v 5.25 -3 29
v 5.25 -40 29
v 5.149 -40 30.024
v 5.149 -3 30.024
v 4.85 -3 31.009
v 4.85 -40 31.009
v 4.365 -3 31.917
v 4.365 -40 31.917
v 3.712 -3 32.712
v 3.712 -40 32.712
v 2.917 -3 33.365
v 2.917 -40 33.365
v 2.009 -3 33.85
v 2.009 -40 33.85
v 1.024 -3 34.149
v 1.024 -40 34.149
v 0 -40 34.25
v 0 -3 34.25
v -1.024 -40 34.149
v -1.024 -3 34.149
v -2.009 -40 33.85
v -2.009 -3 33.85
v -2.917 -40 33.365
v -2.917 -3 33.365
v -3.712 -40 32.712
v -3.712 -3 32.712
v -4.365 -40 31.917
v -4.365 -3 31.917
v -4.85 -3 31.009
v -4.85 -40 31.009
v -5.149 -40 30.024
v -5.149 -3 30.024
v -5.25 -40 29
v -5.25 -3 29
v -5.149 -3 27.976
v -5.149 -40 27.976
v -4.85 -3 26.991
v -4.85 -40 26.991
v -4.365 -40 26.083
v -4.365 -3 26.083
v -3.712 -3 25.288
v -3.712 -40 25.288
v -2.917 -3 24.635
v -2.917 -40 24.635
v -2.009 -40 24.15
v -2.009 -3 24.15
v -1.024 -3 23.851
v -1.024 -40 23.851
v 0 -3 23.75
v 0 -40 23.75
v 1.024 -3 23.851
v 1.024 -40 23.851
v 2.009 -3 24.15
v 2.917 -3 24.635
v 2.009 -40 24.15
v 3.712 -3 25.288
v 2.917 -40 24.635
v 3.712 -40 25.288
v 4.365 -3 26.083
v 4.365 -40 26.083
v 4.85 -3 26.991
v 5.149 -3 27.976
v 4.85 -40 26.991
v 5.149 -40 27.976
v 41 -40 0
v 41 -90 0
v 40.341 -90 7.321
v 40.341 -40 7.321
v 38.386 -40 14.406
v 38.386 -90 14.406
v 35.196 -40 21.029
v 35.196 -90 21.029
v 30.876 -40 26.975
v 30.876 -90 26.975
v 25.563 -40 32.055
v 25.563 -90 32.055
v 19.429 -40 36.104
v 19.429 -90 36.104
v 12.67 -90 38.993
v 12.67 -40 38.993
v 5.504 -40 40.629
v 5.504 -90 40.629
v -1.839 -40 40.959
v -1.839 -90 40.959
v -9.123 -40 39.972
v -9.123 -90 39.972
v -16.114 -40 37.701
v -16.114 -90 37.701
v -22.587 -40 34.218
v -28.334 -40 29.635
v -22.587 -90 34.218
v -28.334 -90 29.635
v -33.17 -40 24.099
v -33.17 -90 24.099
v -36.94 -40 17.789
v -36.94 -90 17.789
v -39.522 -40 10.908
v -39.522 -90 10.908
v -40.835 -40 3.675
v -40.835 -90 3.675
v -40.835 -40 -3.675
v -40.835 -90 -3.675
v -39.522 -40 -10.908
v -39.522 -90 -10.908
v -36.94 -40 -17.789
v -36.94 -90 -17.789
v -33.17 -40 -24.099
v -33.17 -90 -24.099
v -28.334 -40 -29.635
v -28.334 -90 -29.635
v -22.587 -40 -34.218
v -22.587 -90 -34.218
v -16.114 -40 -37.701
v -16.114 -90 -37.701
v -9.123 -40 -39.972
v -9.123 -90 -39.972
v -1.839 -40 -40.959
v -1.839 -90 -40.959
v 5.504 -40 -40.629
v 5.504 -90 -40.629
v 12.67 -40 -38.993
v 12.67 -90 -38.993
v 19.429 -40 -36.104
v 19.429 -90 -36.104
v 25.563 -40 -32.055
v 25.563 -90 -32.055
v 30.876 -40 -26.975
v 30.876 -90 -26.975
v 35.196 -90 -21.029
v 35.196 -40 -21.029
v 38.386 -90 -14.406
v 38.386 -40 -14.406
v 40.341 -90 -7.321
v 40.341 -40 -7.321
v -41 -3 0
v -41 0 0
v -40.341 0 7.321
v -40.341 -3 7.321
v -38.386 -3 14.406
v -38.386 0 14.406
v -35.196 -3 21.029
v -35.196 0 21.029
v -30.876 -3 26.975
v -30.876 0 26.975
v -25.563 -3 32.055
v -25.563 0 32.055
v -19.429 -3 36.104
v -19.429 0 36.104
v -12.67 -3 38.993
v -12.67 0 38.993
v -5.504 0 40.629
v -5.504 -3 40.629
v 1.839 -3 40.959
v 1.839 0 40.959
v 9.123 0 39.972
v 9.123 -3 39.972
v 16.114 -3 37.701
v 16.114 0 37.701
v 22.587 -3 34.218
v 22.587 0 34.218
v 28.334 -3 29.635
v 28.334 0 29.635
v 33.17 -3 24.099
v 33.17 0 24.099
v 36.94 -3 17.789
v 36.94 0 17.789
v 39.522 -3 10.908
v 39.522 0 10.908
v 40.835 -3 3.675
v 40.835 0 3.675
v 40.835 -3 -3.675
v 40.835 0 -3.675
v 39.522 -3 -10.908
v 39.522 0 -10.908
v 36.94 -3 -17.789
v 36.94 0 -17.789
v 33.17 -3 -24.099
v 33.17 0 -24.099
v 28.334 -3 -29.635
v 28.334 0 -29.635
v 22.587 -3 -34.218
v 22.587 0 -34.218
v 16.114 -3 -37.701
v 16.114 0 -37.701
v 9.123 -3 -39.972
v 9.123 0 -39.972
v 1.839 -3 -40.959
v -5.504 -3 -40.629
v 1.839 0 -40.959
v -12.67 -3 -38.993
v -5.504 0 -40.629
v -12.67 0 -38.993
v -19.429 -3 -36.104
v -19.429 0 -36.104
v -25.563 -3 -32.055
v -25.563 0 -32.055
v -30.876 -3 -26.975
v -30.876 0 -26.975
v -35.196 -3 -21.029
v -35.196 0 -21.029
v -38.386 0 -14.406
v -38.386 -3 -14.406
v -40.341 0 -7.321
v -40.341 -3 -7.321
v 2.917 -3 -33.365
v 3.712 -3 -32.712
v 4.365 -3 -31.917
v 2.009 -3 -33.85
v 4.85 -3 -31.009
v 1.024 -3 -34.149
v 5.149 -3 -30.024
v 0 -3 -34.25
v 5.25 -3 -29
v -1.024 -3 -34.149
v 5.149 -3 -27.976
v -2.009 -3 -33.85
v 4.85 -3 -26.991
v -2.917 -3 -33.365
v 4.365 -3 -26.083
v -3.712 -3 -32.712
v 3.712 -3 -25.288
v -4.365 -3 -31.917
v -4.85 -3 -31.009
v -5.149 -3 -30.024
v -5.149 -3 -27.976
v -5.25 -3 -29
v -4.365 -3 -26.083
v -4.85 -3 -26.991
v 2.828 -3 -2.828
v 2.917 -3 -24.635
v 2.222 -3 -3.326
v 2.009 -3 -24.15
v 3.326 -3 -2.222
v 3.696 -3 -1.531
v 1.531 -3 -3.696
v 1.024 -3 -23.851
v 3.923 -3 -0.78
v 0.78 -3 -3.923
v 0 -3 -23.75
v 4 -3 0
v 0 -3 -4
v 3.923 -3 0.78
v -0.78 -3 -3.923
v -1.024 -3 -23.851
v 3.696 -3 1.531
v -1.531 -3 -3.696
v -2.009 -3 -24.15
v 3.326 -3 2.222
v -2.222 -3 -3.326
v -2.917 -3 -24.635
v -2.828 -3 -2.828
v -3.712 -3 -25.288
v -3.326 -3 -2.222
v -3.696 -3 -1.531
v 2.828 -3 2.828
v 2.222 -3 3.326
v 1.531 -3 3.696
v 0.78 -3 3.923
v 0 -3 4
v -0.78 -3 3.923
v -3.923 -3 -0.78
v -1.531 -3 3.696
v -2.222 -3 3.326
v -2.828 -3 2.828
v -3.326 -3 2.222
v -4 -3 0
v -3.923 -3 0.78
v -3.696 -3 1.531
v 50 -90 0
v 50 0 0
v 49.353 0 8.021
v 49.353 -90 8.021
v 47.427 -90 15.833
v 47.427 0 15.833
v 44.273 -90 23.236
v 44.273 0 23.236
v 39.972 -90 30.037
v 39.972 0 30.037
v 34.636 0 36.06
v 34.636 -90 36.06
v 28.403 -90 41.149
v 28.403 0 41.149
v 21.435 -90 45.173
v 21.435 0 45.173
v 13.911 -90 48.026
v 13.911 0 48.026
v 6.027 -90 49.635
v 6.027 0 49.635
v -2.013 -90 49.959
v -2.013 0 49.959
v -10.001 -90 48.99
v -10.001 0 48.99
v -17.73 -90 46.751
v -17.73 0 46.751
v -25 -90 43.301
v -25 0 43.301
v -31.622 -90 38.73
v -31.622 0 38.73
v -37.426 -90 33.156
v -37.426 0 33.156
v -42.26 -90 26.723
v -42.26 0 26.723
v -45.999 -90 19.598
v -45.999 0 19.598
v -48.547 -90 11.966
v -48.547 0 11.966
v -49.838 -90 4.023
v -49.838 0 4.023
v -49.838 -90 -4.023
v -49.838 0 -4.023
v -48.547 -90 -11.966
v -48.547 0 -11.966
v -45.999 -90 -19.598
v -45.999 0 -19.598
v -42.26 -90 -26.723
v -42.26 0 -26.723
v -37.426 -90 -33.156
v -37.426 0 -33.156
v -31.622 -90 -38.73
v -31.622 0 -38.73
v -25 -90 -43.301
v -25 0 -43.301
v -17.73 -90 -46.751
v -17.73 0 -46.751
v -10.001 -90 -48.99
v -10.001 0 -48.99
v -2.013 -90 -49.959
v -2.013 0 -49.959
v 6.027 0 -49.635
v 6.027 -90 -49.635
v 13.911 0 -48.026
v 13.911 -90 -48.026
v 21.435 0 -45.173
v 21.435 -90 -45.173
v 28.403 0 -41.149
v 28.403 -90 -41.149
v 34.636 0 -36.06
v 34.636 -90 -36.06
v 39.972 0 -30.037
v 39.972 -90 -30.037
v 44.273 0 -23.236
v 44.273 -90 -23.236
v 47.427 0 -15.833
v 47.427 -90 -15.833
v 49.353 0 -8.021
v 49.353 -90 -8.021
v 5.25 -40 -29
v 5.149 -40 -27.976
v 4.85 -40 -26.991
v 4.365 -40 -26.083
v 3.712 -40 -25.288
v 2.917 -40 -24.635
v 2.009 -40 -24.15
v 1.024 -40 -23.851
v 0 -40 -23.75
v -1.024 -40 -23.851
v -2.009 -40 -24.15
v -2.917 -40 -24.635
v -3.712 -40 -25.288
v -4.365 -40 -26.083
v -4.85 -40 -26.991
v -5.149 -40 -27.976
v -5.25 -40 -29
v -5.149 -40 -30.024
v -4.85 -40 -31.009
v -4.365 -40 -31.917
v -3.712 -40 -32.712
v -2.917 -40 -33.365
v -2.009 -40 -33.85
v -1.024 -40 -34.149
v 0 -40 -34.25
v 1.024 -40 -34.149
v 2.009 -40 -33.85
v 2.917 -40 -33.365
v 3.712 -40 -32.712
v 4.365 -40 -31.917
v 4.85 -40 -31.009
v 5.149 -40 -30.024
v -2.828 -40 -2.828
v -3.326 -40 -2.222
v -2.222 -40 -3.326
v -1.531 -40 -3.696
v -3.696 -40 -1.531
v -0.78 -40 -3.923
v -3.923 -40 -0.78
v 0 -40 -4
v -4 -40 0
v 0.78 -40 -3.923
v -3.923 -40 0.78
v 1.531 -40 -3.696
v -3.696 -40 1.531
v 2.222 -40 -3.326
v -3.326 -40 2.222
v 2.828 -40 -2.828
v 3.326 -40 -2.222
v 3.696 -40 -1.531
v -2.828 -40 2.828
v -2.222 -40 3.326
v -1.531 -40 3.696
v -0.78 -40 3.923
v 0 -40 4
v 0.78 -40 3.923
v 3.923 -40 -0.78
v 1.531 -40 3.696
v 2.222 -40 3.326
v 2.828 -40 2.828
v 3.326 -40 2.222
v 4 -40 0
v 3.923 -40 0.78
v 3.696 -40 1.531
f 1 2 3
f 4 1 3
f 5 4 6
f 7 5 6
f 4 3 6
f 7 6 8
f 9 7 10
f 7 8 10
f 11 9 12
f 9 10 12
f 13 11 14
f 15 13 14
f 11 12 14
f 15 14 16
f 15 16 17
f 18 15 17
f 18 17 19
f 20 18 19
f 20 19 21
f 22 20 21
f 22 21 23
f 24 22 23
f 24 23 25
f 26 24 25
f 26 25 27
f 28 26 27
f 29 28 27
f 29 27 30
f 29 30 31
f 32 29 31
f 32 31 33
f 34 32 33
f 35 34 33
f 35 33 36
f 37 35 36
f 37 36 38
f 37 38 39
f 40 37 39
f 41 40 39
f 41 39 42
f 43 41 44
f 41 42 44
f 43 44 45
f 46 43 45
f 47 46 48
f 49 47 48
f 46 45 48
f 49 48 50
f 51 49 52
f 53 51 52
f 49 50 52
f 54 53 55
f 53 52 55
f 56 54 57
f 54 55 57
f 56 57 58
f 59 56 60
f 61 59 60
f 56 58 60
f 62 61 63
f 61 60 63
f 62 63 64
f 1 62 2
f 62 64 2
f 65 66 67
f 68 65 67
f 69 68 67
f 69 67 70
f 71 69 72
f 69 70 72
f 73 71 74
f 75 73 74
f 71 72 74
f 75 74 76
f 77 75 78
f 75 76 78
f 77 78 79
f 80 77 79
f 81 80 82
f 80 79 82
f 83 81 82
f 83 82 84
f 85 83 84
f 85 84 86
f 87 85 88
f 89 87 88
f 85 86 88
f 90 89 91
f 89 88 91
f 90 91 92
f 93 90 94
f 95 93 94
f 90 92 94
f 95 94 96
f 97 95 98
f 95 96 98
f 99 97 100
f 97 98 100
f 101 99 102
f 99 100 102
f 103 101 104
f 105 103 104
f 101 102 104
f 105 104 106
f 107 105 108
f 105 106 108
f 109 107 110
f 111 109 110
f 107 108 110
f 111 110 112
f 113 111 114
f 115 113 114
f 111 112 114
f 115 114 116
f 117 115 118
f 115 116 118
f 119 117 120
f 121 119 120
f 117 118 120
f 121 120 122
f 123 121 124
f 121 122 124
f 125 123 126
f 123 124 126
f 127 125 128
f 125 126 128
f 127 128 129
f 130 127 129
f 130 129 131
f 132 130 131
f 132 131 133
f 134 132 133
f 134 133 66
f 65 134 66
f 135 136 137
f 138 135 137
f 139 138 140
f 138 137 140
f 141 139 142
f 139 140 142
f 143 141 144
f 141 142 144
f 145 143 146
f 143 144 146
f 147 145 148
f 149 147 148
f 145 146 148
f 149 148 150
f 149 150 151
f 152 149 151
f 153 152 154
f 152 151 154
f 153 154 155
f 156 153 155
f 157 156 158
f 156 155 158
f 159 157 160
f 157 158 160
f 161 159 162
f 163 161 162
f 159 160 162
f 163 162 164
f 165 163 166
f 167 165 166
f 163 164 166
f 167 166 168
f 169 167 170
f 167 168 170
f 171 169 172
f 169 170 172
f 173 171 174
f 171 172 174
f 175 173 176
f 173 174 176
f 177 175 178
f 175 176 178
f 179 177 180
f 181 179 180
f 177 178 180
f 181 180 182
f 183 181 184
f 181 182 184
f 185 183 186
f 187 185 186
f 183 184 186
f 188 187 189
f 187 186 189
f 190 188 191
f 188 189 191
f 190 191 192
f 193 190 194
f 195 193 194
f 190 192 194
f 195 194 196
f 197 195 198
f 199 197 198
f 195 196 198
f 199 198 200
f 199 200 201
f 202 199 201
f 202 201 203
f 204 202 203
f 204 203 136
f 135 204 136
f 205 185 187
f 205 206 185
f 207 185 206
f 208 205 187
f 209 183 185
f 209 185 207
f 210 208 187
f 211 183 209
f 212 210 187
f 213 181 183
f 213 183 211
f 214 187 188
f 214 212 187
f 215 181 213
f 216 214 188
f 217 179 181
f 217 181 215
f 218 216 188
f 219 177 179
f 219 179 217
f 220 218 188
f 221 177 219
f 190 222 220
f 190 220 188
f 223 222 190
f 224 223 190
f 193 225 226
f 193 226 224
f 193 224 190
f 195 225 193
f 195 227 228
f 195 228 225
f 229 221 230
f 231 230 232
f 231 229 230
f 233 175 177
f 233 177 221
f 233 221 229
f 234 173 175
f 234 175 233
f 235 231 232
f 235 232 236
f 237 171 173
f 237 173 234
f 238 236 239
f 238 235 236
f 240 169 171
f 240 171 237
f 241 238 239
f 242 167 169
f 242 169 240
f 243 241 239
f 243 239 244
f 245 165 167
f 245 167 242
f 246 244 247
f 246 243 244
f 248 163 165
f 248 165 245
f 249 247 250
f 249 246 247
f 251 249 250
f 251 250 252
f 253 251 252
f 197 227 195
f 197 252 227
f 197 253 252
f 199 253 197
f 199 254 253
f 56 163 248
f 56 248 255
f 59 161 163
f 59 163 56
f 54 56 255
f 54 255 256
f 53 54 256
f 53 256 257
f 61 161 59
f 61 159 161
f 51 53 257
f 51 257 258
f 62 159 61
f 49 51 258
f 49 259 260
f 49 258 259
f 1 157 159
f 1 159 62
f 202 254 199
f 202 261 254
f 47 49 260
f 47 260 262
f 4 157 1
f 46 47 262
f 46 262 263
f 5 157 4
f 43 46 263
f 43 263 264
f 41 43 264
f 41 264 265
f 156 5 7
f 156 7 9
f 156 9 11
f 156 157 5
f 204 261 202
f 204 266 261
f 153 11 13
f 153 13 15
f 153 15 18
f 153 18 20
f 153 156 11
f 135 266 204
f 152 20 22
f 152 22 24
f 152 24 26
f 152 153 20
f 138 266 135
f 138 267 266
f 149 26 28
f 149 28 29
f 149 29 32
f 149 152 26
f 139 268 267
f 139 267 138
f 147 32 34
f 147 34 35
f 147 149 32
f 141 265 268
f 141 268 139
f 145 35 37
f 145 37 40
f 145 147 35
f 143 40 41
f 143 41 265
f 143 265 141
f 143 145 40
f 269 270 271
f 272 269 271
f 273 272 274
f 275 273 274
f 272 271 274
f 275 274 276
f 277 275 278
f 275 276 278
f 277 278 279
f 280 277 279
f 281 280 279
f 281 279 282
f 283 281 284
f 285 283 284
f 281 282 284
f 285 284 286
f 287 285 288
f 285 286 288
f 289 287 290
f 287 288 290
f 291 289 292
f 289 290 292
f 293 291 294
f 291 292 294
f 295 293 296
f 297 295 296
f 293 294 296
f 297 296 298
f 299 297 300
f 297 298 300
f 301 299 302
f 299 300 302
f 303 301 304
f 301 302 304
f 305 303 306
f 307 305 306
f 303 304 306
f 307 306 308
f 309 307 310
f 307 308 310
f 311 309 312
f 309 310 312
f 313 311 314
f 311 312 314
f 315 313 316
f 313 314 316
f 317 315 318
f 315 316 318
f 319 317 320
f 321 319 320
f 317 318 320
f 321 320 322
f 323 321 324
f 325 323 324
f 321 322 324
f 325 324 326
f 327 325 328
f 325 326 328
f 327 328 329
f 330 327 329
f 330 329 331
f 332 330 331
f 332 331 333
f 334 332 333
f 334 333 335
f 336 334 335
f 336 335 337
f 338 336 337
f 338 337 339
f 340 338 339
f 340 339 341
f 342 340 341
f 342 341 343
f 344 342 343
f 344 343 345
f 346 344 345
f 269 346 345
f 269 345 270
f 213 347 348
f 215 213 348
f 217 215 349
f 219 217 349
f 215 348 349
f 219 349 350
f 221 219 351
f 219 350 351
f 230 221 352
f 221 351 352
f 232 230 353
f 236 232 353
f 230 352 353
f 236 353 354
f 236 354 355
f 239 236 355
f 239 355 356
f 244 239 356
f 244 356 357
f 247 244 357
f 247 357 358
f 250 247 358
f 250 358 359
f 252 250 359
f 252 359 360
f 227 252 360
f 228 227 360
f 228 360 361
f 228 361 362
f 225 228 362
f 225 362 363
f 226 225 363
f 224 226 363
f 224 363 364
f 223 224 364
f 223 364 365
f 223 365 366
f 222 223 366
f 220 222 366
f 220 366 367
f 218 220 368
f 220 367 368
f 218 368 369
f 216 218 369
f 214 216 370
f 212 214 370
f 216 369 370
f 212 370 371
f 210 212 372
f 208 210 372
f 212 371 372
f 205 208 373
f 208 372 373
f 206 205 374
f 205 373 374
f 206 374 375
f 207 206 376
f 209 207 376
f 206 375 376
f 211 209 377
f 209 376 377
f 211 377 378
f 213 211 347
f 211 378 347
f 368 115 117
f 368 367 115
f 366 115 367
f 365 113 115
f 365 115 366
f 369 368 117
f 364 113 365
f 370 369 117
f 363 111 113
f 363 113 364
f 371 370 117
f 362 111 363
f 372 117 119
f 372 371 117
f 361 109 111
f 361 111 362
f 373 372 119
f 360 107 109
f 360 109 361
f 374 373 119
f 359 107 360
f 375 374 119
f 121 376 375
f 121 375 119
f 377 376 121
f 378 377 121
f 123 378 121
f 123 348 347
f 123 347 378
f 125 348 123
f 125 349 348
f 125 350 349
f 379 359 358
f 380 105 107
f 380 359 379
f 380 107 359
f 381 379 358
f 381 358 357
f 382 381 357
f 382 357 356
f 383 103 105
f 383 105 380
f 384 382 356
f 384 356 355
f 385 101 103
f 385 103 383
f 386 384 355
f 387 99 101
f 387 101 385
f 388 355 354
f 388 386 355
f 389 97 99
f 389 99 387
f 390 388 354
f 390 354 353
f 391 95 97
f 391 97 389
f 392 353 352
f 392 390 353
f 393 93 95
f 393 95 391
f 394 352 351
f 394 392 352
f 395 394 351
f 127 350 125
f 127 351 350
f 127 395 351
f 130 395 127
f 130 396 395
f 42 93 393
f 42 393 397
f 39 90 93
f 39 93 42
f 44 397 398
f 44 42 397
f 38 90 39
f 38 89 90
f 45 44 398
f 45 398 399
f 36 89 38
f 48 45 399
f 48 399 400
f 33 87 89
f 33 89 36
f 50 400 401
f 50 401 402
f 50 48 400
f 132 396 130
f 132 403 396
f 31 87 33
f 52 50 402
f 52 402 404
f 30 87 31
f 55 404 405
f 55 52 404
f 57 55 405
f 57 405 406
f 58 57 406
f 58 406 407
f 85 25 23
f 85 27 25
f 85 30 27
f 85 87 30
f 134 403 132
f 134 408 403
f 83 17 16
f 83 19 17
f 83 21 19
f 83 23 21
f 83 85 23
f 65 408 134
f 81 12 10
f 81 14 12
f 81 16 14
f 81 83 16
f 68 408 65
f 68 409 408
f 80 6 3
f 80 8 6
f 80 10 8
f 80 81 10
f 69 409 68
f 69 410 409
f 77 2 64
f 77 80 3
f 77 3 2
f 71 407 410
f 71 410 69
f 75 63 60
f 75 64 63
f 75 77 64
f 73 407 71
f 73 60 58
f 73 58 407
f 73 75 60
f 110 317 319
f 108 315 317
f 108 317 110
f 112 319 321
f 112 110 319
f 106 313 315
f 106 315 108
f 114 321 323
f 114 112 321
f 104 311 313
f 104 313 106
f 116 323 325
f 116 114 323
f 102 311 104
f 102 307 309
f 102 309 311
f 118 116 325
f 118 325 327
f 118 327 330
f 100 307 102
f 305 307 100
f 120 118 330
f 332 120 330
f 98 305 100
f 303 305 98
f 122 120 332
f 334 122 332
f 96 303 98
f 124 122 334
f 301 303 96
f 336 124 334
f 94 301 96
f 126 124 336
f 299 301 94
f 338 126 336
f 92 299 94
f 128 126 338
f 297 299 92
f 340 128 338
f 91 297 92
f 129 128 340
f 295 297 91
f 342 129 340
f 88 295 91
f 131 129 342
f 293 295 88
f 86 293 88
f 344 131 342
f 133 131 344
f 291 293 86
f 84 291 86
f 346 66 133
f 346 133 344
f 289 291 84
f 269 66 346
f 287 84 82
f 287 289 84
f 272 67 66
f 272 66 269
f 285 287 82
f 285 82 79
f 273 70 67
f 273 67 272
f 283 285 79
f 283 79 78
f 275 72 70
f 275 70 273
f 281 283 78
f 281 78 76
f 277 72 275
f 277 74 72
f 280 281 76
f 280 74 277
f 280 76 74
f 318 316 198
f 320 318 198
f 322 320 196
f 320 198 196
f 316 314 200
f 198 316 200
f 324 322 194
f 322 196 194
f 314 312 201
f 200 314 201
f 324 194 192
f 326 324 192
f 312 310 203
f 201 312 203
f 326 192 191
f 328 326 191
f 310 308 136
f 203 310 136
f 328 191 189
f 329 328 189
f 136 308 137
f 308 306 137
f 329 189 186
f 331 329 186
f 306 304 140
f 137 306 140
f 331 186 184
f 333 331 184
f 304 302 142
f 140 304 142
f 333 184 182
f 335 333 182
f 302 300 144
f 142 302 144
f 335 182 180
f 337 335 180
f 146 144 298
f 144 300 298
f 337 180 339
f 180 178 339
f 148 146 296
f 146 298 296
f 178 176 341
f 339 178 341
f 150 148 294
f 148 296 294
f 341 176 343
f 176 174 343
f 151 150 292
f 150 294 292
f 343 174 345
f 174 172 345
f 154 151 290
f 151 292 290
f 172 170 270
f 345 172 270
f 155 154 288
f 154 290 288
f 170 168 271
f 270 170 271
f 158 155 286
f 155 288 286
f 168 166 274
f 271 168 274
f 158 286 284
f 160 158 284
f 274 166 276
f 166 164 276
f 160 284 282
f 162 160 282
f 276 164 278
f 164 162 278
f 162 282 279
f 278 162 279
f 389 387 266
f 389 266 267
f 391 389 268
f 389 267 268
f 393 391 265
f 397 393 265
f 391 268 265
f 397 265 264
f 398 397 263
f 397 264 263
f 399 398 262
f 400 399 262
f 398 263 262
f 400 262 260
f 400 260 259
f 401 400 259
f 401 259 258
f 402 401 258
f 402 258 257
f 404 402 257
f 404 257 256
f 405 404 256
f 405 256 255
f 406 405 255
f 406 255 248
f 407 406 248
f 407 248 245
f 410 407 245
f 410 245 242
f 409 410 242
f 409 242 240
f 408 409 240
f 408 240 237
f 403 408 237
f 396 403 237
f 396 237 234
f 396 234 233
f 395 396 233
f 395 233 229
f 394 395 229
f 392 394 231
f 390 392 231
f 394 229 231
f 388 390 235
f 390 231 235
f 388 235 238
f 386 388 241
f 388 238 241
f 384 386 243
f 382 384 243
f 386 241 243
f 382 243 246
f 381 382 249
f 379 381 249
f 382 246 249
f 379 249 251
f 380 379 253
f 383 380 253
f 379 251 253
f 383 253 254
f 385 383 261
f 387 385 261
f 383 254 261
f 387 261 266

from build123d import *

# Parameters (mm, degrees)
F0_R     = 50
F1_DEPTH = 90
F2_R     = 41
F3_DEPTH = 50
F4_R     = 4
F5_DEPTH = 151
F6_R     = 41
F7_DEPTH = 3
F8_R     = 5.25
F9_DEPTH = 72


with BuildPart() as f1:
    # F0 (on Front) → F1 (new body)
    with BuildSketch(Plane.XZ):
        Circle(F0_R)
    extrude(amount=F1_DEPTH)

    # F2 (on face) → F3 (cut)
    with BuildSketch(Plane.XZ.offset(90)):
        Circle(F2_R)
    extrude(amount=-F3_DEPTH, mode=Mode.SUBTRACT)

    # F4 (on face) → F5 (cut)
    with BuildSketch(Plane(origin=(0, 0, 0), x_dir=(-1, 0, 0), z_dir=(0, 1, 0))):
        Circle(F4_R)
    extrude(amount=-F5_DEPTH, mode=Mode.SUBTRACT)

    # F6 (on face) → F7 (cut)
    with BuildSketch(Plane(origin=(0, 0, 0), x_dir=(-1, 0, 0), z_dir=(0, 1, 0))):
        Circle(F6_R)
    extrude(amount=-F7_DEPTH, mode=Mode.SUBTRACT)

    # F8 (on face) → F9 (cut)
    with BuildSketch(Plane.XZ.offset(40)):
        with Locations((0, 29)):
            Circle(F8_R)
        with Locations((0, -29)):
            Circle(F8_R)
    extrude(amount=-F9_DEPTH, mode=Mode.SUBTRACT)


solid = f1.part
